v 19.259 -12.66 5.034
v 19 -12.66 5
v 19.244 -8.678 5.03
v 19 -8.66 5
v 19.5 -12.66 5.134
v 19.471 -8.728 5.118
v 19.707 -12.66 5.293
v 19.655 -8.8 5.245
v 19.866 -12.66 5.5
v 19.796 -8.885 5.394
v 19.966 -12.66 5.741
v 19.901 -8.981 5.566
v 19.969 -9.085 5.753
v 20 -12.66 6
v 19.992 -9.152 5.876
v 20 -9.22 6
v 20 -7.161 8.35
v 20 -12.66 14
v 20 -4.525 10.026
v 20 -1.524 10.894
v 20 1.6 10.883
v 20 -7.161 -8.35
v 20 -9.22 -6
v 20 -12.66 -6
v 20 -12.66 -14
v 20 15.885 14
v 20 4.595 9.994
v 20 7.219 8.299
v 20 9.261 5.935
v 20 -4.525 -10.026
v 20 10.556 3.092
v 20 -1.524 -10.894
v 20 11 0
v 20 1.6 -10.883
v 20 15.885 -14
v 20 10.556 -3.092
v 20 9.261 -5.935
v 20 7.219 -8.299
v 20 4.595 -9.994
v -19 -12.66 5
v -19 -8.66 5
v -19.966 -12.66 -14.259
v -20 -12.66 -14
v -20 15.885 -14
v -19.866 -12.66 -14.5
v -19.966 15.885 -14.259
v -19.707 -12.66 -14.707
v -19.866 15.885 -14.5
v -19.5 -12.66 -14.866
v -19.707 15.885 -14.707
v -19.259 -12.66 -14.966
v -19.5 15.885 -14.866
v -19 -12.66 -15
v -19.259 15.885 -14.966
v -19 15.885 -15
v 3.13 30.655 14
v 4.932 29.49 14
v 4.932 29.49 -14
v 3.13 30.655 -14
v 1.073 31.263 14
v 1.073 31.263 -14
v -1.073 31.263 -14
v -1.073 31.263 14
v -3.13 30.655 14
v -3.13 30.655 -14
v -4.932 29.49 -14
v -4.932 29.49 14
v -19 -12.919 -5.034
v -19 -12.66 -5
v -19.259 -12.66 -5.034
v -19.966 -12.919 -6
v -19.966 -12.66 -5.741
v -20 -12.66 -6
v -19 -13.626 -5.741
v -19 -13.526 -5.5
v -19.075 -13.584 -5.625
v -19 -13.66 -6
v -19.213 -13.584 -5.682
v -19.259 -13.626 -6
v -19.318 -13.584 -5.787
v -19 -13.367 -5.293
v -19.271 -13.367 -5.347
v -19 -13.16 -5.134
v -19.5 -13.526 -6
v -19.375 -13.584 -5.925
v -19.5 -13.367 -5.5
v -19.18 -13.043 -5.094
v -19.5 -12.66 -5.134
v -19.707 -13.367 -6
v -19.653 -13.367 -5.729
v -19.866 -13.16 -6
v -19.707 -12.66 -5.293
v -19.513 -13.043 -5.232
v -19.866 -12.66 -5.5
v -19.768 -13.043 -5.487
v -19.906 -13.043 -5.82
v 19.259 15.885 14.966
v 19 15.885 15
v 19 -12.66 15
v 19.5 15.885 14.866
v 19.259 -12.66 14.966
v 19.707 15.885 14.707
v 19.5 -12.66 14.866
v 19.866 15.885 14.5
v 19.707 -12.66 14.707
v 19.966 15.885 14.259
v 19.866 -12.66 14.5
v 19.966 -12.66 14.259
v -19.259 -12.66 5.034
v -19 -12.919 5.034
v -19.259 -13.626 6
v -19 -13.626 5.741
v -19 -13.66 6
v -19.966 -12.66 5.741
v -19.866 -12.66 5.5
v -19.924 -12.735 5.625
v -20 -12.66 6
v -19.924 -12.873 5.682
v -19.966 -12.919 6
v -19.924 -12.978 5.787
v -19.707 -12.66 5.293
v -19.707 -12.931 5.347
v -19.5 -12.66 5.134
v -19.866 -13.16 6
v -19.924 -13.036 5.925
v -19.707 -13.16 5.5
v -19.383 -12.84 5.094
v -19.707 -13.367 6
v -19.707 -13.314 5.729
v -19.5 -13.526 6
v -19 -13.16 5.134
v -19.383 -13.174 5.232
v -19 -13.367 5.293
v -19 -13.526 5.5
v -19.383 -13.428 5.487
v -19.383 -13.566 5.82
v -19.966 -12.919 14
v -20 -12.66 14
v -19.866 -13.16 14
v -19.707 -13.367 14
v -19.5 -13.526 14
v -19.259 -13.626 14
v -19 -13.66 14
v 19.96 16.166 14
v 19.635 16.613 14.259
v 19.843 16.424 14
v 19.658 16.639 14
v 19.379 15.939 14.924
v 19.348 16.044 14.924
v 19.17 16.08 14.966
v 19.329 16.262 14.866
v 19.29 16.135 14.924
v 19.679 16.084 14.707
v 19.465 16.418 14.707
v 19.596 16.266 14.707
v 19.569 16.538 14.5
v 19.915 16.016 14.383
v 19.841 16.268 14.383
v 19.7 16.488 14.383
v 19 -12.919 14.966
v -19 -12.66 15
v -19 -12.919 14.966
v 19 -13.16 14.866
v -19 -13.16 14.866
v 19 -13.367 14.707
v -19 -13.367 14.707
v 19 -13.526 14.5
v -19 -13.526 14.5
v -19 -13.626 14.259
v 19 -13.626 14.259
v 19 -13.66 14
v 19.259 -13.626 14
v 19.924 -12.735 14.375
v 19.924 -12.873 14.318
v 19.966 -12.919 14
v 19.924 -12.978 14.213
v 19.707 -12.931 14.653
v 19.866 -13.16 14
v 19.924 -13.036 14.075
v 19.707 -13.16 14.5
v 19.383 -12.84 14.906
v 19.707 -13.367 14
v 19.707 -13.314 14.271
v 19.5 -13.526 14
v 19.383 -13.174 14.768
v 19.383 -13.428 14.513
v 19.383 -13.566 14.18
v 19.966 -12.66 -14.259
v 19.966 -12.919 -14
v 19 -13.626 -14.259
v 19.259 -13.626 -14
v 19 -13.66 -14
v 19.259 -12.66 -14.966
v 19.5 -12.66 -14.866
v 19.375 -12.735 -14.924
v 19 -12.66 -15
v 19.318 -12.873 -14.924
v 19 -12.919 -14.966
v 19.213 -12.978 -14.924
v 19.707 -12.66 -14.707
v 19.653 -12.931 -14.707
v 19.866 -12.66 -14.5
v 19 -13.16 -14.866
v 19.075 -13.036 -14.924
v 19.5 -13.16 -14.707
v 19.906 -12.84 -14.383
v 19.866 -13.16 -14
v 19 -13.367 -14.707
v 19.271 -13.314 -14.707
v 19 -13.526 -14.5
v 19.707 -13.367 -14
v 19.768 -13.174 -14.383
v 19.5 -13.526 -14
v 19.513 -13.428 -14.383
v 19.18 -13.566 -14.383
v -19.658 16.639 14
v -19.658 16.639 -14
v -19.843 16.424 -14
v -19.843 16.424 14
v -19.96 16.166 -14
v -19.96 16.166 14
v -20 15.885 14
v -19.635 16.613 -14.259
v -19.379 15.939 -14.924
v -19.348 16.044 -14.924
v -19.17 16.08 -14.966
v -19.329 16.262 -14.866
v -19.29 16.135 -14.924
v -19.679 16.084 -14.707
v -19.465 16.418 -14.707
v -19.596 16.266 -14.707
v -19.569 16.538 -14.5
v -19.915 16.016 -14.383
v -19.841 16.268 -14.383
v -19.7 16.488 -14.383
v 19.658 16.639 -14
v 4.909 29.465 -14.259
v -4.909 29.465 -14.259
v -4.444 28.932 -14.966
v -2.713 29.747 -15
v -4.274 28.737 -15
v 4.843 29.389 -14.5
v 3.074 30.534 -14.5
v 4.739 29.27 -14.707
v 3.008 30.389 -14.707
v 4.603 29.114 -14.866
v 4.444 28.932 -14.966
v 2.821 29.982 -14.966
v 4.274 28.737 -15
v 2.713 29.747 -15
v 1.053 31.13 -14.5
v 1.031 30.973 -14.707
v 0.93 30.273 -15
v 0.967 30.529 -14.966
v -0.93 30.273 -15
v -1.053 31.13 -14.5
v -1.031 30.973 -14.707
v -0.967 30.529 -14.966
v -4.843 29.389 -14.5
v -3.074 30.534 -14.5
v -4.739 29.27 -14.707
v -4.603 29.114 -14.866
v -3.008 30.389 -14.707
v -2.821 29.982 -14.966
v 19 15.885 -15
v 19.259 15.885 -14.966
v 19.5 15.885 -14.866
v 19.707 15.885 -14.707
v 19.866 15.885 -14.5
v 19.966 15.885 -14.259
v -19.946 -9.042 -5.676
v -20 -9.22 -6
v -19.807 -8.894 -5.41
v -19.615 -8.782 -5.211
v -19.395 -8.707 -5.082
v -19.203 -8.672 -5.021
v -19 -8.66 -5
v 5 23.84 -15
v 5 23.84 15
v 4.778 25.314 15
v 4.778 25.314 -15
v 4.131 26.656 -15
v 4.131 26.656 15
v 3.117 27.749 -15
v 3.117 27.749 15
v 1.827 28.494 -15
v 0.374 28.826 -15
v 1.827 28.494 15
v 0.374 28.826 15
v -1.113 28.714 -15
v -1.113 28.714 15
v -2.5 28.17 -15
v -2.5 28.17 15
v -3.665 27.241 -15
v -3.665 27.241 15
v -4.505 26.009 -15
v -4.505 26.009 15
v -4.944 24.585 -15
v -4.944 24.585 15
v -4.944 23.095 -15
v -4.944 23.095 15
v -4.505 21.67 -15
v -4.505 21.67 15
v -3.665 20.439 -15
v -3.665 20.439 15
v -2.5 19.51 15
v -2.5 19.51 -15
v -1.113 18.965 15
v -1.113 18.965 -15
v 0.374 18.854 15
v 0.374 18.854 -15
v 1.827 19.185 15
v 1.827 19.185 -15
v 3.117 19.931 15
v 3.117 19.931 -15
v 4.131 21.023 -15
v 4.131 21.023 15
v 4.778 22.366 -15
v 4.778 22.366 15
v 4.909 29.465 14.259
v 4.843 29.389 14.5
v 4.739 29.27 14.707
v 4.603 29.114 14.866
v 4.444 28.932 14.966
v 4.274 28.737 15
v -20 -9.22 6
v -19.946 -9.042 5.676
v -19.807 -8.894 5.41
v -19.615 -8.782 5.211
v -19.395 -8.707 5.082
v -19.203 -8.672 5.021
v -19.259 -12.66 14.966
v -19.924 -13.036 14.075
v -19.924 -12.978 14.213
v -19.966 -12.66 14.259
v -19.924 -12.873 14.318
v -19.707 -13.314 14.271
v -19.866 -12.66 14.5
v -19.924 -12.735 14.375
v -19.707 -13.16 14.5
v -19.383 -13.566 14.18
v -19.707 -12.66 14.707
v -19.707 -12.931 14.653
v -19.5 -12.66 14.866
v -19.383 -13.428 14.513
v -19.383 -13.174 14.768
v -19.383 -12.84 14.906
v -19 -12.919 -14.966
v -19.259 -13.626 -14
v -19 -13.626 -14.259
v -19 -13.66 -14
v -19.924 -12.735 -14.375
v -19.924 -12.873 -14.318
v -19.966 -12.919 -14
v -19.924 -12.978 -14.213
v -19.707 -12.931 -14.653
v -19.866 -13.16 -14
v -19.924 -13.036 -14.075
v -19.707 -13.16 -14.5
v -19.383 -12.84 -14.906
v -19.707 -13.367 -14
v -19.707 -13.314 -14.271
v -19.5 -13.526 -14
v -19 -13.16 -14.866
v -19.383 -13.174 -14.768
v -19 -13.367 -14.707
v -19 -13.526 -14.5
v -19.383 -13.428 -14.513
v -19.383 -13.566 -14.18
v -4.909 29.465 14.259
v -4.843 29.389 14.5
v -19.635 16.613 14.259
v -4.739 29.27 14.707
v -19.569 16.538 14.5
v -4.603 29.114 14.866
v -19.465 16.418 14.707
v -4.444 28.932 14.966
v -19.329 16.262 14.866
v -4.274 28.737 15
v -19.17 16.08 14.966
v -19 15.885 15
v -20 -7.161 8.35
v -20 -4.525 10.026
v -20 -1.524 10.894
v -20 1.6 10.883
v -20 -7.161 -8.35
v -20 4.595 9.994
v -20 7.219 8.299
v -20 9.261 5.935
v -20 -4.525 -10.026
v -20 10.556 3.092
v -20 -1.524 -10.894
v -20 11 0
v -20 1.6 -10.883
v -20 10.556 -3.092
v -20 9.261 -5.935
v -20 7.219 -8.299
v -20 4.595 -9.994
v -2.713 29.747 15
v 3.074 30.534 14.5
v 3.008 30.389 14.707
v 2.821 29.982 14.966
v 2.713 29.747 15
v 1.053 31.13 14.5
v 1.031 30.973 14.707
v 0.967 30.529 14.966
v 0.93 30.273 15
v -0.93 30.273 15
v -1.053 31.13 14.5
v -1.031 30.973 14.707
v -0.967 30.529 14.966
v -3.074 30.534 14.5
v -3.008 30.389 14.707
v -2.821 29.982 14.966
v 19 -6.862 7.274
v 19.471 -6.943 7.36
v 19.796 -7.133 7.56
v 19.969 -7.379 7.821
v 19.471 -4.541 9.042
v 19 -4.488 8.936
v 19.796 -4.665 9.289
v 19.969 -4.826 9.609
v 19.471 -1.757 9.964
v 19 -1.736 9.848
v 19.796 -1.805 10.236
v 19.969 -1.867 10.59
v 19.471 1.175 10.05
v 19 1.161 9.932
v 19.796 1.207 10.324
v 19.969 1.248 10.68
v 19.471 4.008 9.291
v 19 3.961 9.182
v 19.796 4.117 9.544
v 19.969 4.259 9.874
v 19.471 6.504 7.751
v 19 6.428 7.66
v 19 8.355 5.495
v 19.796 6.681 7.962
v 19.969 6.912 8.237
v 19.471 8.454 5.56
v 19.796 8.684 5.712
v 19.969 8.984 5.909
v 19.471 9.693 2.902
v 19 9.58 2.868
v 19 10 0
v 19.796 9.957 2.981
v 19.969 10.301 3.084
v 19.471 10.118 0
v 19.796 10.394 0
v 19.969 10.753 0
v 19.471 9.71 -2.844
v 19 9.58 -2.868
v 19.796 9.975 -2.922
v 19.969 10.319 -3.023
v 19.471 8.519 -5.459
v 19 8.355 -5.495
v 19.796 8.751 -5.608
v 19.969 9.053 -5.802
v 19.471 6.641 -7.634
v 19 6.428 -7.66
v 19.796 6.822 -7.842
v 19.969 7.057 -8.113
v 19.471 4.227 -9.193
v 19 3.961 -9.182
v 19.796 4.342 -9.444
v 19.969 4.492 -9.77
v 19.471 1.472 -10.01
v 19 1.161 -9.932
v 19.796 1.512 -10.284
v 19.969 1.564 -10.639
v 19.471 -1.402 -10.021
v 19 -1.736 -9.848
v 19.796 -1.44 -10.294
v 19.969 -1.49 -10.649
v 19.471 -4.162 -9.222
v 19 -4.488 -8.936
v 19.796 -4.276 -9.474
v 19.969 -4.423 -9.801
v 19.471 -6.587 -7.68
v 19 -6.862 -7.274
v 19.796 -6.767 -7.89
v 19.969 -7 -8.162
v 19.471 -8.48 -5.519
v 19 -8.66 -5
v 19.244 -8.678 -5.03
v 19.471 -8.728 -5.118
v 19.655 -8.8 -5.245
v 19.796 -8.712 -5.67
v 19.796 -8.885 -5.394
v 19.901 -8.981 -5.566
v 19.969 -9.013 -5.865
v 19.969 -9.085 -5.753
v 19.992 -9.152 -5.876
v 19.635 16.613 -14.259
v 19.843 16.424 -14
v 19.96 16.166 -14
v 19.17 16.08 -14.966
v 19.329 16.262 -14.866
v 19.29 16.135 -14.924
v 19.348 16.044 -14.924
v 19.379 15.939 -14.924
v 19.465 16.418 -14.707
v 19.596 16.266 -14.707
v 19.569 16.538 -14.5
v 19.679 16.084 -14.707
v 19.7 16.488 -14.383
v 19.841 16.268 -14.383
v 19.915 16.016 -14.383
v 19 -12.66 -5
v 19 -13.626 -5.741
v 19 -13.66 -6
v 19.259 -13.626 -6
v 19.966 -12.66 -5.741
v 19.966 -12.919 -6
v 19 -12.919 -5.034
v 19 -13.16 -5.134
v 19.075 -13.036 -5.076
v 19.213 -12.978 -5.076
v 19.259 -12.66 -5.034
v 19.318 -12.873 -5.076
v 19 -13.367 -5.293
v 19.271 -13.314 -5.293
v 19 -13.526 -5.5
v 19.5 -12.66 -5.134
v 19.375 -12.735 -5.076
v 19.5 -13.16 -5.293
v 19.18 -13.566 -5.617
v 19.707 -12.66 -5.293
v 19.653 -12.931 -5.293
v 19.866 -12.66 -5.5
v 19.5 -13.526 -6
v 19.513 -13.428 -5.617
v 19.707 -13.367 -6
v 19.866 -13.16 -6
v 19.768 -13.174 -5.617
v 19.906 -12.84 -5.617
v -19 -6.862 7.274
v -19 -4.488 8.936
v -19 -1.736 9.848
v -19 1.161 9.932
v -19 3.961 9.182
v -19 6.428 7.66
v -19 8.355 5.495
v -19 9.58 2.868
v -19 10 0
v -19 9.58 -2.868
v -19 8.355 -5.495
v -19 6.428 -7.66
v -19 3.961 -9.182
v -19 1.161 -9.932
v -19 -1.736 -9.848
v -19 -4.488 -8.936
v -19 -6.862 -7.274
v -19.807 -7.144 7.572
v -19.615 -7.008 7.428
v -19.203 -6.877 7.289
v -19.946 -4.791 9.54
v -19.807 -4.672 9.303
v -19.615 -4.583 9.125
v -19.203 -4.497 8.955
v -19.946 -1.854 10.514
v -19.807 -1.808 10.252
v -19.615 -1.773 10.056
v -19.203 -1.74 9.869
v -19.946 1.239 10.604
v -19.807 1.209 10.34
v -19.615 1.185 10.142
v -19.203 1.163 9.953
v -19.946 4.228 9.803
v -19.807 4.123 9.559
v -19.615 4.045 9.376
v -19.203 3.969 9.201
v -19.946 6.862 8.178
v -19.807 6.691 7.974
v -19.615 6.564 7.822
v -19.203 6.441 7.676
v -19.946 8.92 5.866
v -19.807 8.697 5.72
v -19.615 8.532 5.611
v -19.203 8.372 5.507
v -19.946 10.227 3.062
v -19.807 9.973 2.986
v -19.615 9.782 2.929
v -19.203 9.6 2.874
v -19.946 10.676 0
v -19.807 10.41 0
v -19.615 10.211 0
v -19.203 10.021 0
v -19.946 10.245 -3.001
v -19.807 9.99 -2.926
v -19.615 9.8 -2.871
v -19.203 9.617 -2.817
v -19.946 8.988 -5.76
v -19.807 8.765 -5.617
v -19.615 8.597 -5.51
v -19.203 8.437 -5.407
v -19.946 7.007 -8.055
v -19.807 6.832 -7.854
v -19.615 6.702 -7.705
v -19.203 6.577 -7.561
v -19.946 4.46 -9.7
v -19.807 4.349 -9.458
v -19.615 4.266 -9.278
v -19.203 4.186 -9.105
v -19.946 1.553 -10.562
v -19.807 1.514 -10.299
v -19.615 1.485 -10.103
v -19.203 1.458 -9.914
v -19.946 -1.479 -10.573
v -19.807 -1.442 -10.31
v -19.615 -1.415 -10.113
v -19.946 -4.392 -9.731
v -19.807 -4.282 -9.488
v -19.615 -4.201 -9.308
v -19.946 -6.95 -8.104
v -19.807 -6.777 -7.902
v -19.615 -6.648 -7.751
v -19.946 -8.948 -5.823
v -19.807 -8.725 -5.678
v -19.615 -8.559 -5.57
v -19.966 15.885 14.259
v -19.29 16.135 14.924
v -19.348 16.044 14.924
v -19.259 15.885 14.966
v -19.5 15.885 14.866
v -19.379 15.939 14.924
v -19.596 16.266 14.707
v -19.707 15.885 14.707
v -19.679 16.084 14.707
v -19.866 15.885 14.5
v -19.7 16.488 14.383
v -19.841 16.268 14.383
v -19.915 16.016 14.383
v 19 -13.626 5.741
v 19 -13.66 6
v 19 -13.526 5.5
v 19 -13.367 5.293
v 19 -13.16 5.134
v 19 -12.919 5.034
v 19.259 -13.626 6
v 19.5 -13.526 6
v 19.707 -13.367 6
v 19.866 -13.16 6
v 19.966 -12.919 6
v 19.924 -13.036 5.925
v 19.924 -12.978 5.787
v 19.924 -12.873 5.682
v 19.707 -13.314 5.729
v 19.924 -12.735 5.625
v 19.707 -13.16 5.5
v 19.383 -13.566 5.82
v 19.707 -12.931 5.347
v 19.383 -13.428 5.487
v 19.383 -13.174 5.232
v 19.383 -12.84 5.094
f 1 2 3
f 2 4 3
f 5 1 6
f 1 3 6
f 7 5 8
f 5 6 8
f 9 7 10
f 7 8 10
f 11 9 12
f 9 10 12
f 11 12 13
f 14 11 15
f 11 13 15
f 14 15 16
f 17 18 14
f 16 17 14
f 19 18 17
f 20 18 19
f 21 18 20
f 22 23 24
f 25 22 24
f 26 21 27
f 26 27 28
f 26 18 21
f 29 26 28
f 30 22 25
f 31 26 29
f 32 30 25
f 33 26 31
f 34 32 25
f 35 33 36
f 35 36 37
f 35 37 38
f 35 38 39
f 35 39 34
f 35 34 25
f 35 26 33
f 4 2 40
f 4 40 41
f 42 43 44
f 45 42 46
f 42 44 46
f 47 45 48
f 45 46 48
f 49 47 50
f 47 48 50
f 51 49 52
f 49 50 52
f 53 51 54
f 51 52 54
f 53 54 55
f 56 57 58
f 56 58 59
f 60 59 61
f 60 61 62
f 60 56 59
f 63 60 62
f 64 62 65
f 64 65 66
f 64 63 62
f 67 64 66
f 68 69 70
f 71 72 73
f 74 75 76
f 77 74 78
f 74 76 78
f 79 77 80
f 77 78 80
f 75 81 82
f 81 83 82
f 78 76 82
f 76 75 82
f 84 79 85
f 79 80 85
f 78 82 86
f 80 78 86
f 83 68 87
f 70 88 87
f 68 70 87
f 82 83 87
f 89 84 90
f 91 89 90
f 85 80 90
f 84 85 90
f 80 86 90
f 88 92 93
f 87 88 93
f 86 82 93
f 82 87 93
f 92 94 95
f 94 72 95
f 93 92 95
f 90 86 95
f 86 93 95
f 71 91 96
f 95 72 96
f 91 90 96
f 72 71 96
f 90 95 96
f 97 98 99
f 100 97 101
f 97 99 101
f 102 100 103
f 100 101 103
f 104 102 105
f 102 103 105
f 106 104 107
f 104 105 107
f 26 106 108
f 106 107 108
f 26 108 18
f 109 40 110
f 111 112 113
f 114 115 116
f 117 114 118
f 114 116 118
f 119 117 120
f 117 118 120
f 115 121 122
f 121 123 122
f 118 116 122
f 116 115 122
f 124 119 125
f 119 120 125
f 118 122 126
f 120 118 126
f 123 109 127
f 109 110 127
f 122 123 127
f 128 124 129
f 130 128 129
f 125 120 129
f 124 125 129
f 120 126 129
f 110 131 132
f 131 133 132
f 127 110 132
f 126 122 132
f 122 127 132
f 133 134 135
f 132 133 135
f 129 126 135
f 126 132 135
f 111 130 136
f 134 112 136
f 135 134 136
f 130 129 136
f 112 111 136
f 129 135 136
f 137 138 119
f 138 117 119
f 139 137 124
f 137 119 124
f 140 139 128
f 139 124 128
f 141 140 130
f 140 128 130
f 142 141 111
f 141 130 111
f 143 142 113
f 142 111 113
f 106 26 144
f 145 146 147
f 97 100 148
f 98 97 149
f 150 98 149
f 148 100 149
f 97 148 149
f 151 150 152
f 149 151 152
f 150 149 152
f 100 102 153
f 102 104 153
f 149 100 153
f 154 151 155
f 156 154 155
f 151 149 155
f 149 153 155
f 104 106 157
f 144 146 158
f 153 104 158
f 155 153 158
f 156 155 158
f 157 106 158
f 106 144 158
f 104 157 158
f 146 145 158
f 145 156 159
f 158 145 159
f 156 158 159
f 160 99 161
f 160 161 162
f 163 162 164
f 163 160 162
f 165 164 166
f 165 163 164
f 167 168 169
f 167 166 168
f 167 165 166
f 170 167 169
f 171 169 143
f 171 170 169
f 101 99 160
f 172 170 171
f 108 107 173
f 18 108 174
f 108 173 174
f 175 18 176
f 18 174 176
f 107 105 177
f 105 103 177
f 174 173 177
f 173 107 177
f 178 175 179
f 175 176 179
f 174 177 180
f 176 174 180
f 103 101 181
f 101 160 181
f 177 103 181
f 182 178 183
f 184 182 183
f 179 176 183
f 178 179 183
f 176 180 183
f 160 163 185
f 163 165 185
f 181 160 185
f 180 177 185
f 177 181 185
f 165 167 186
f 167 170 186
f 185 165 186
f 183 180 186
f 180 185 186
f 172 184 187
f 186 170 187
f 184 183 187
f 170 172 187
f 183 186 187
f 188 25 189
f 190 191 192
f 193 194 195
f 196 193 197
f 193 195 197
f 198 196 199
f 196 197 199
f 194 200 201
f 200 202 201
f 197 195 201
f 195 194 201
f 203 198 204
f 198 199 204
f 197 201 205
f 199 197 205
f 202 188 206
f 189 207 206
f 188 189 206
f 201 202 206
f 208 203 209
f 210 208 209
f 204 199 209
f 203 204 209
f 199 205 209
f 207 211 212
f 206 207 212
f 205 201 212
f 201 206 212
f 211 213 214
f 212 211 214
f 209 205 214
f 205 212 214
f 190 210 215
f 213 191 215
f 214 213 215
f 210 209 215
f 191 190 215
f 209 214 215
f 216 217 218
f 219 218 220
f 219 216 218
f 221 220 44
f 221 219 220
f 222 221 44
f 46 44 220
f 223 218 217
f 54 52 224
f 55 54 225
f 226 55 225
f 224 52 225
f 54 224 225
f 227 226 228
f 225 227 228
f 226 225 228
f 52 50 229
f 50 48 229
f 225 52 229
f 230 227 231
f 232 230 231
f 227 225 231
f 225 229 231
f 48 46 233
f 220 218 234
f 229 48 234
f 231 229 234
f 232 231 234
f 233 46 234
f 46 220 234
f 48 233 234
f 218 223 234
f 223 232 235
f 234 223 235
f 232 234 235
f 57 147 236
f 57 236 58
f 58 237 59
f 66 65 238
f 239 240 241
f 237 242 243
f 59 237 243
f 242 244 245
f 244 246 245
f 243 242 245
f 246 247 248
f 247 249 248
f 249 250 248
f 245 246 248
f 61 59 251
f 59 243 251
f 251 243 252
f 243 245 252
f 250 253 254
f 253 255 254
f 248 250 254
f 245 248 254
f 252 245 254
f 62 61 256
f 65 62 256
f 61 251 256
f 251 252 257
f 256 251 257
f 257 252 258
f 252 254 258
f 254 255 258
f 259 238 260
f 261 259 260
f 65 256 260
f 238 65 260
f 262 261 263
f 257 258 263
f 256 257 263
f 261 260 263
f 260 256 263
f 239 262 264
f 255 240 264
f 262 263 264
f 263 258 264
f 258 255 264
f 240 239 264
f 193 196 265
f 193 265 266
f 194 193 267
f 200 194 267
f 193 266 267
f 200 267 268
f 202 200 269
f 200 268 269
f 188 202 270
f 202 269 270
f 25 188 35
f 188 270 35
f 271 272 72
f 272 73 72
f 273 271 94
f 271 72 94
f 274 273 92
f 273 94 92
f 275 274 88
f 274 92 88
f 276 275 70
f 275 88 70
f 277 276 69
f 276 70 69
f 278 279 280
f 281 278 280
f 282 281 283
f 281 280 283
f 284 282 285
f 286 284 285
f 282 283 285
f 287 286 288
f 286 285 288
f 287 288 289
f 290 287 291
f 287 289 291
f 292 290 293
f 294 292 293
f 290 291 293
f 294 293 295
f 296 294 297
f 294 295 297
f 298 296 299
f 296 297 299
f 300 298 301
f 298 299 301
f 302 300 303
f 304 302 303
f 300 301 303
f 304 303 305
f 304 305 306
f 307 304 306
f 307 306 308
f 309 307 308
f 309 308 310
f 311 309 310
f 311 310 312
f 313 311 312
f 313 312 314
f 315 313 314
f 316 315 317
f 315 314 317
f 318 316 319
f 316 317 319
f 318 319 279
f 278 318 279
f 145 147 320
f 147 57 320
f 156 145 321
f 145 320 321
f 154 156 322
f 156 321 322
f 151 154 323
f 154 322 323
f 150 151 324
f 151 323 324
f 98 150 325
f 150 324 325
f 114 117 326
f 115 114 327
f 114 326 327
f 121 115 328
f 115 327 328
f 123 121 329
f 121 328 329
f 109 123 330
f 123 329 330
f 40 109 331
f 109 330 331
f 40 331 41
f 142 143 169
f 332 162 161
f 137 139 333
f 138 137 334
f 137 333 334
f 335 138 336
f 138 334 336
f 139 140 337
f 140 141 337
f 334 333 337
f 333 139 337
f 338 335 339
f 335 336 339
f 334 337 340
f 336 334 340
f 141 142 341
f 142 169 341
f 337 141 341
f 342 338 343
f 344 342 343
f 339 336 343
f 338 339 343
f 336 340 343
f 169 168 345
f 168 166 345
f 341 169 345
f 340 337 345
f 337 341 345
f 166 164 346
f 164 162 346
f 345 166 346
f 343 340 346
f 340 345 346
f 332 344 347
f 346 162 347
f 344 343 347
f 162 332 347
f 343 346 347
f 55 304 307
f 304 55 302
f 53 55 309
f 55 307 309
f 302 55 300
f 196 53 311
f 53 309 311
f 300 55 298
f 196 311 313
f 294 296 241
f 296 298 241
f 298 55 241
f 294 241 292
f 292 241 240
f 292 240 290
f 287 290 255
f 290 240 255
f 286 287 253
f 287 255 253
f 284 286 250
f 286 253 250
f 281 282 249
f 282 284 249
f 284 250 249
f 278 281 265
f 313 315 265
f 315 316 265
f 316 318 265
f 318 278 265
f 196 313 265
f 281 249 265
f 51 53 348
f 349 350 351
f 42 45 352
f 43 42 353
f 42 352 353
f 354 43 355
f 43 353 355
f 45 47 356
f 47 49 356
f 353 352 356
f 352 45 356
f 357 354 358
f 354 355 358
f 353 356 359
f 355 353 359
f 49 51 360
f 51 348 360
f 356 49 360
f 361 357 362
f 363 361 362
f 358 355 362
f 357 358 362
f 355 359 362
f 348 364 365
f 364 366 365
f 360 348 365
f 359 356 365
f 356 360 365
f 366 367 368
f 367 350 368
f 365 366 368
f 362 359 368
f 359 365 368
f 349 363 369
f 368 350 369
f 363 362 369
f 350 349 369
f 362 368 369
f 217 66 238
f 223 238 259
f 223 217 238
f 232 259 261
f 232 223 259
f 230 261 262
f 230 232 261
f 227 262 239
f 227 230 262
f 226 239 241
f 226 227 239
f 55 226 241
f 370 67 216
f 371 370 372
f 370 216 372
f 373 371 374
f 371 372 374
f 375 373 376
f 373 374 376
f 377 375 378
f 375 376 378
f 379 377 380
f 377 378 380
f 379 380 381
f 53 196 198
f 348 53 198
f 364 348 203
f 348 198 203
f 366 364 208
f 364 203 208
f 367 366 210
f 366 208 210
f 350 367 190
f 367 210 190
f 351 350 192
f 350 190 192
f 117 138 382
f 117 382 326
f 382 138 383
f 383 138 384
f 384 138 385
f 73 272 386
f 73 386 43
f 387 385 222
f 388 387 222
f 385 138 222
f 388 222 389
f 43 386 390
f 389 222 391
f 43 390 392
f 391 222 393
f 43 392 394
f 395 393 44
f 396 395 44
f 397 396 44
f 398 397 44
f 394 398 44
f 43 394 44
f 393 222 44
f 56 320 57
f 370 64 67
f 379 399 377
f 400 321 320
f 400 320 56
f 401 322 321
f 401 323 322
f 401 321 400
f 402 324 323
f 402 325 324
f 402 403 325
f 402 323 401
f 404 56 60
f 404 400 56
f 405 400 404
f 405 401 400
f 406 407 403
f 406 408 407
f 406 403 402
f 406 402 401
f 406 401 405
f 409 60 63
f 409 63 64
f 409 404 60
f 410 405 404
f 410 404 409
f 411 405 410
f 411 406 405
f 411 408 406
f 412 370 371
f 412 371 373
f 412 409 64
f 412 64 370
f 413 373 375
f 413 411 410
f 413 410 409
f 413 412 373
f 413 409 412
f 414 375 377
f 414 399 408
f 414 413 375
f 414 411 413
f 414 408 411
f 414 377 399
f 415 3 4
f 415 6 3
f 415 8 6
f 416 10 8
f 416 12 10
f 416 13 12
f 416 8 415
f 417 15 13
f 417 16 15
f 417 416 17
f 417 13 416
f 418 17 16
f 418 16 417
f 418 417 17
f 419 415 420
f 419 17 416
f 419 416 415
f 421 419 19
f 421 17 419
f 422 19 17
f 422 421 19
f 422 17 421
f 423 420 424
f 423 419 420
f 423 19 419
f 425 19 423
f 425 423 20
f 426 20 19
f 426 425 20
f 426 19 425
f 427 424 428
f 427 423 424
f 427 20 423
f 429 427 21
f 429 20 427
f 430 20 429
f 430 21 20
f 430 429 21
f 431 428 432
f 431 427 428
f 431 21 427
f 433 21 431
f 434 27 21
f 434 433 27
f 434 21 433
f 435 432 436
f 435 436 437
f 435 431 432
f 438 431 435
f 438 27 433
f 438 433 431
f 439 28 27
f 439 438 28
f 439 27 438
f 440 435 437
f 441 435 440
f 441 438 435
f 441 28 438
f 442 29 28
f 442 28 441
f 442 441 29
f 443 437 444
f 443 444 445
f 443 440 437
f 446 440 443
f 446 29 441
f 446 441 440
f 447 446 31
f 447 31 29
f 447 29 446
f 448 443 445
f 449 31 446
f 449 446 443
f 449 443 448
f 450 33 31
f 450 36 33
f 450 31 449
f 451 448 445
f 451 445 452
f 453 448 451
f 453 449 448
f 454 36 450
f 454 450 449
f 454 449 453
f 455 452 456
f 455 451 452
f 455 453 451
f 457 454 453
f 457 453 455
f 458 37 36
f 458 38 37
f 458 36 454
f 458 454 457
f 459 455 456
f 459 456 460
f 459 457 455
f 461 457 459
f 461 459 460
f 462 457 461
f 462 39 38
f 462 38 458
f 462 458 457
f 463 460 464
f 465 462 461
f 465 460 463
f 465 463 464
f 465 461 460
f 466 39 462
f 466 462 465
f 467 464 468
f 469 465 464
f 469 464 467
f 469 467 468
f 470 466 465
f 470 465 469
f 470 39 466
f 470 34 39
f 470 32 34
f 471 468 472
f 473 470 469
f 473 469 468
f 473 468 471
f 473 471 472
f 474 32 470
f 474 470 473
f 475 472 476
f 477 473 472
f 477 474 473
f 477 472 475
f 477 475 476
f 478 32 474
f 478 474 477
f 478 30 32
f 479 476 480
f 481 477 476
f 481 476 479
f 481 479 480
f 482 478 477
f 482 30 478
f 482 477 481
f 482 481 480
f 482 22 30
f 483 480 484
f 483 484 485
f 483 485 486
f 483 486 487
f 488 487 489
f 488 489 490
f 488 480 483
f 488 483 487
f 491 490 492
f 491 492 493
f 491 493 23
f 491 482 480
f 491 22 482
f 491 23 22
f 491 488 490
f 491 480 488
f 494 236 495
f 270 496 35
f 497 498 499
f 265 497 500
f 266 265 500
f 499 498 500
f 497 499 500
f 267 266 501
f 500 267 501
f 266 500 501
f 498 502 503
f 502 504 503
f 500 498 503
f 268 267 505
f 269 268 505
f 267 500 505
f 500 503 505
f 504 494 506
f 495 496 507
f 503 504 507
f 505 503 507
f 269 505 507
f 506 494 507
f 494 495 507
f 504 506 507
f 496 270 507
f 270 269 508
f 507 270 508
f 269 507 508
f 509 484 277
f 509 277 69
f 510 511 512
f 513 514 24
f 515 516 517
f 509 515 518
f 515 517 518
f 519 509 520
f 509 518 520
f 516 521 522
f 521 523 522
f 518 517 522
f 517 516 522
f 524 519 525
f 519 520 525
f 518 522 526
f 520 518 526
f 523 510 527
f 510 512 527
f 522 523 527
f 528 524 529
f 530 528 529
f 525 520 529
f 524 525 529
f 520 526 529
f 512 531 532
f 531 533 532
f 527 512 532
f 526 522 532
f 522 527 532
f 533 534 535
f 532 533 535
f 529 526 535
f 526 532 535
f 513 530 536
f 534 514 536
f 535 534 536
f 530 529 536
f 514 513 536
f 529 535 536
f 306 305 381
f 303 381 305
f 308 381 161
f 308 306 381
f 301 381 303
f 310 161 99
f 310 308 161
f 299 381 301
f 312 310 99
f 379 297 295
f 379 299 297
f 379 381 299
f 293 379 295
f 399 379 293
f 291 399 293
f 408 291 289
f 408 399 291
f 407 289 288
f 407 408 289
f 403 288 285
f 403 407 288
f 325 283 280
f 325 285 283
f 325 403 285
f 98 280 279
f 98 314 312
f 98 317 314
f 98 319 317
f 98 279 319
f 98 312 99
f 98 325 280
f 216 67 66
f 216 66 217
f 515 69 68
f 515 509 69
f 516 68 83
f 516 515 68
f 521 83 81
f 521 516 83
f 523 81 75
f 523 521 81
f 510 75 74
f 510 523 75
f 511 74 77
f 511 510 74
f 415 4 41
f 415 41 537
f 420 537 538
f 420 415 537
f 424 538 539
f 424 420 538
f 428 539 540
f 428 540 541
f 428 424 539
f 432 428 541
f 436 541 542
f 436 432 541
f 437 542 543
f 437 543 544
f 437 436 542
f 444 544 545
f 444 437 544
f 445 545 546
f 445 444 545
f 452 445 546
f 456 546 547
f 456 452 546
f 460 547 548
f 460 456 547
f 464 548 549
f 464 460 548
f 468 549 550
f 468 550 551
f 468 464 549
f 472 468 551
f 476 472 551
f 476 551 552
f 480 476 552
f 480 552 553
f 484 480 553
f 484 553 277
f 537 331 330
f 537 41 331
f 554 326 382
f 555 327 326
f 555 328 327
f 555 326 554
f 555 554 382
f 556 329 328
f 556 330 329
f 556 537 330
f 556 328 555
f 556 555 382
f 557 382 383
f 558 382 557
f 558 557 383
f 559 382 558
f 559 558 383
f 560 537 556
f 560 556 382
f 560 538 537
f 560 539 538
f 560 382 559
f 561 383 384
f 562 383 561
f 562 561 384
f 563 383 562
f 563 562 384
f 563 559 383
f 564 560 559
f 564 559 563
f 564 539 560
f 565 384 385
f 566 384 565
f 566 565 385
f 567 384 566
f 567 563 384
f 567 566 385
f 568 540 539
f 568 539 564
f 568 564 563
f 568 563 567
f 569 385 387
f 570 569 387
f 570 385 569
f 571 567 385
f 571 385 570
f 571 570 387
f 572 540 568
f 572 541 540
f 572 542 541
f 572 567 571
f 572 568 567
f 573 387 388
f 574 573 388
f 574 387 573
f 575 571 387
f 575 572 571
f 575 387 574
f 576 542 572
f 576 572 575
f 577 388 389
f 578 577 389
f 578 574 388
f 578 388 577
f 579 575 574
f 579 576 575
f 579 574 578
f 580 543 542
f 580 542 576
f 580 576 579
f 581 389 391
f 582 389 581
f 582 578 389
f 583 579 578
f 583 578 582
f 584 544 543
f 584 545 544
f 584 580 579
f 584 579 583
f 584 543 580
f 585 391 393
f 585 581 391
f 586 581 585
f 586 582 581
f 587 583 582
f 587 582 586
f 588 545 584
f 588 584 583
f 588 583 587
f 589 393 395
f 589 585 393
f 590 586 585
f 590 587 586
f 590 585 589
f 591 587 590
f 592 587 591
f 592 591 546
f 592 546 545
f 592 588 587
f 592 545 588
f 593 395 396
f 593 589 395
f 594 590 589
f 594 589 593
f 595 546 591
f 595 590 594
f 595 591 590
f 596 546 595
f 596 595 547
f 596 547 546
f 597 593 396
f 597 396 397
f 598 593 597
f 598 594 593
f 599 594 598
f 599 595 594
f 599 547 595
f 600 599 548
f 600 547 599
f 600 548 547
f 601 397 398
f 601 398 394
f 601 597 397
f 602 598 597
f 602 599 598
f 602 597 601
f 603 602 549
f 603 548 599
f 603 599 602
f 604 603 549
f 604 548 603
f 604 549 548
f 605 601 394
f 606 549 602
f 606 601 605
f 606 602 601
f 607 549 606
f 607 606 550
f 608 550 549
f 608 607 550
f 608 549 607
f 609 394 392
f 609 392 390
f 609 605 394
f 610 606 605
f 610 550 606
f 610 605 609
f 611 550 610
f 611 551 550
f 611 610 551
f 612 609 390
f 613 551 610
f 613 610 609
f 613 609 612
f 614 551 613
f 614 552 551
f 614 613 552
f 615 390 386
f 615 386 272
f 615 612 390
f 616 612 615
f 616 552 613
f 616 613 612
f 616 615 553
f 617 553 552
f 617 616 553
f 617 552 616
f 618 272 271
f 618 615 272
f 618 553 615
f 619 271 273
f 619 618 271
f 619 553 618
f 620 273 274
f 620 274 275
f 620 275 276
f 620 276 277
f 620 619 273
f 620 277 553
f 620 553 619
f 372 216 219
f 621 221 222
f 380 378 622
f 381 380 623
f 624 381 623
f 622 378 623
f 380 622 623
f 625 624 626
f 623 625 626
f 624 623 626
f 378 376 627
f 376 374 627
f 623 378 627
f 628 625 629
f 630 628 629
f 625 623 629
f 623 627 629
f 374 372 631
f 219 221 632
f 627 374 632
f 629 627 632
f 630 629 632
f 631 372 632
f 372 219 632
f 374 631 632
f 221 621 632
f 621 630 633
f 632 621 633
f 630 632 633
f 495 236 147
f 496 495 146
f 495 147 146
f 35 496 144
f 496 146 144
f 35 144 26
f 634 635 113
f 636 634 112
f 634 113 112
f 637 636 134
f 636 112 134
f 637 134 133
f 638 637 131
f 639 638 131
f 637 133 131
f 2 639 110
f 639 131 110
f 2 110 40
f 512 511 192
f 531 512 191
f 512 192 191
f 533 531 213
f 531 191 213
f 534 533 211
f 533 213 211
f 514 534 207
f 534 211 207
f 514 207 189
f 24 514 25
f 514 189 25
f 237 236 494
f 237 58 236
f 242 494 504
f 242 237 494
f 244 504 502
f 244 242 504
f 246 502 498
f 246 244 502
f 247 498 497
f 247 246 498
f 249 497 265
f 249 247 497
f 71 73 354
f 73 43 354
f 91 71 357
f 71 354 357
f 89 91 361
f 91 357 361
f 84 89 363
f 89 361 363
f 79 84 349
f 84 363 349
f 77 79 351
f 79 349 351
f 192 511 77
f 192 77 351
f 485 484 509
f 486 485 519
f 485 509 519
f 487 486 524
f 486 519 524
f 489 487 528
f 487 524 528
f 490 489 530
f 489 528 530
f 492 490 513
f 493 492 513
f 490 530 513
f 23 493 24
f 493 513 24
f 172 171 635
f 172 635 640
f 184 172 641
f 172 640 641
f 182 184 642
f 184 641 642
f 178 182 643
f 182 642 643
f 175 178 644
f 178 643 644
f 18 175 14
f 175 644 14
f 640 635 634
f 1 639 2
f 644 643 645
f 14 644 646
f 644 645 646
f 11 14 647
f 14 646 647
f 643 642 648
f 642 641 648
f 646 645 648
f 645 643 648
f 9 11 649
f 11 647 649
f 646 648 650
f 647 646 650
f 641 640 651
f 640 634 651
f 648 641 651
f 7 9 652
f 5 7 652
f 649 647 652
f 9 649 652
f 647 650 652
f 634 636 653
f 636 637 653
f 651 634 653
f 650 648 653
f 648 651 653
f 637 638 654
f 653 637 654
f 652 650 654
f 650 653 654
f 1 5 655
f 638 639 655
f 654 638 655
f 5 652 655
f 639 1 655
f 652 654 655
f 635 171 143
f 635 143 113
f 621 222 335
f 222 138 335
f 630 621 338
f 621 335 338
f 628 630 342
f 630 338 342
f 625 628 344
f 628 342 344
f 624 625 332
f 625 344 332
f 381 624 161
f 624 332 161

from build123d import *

# Parameters (mm, degrees)
BOSS_EXTRUDE1_DEPTH = 20
SKETCH3_R           = 5
BOSS_EXTRUDE2_DEPTH = 30
FILLET1_R           = 1


with BuildPart() as part:
    # Sketch1 → Boss-Extrude1 (new body, symmetric)
    with BuildSketch(Plane(origin=(0, 0, 0), x_dir=(0, 0, -1), z_dir=(1, 0, 0))):
        with BuildLine():
            Line((5, -8.660254038), (5, -13.660254038))
            Line((5, -13.660254038), (15, -13.660254038))
            Line((15, -13.660254038), (15, 16.339745962))
            Line((15, 16.339745962), (-15, 16.339745962))
            Line((-15, 16.339745962), (-15, -13.660254038))
            Line((-15, -13.660254038), (-5, -13.660254038))
            Line((-5, -13.660254038), (-5, -8.660254038))
            ThreePointArc((-5, -8.660254038), (0, 10), (5, -8.660254038))
        make_face()
    extrude(amount=BOSS_EXTRUDE1_DEPTH, both=True)

    # Sketch3 → Boss-Extrude2 (add)
    with BuildSketch(Plane.XY.offset(15)):
        with BuildLine():
            Line((-20, 16.339745962), (20, 16.339745962))
            Line((20, 16.339745962), (4.931506849, 29.490430894))
            ThreePointArc((4.931506849, 29.490430894), (0, 31.339745962), (-4.931506849, 29.490430894))
            Line((-4.931506849, 29.490430894), (-20, 16.339745962))
        make_face()
        with Locations((0, 23.839745962)):
            Circle(SKETCH3_R, mode=Mode.SUBTRACT)
    extrude(amount=-BOSS_EXTRUDE2_DEPTH)

    # Fillet1
    fillet1_edges = [part.edges().sort_by_distance(p)[0] for p in [
        (20, -13.660254038, -10),
        (-20, -11.160254038, -5),
        (-20, 10, 0),
        (20, 1.339745962, -15),
        (0, -13.660254038, 5),
        (0, -13.660254038, 15),
        (0, -13.660254038, -15),
        (0, -13.660254038, -5),
        (20, 16.339745962, 0),
        (20, 1.339745962, 15),
        (20, -13.660254038, 10),
        (-12.465753425, 22.915088428, 15),
        (12.465753425, 22.915088428, 15),
        (0, 31.339745962, 15),
        (20, -11.160254038, 5),
        (-12.465753425, 22.915088428, -15),
        (0, 31.339745962, -15),
        (12.465753425, 22.915088428, -15),
        (20, 10, 0),
        (20, -11.160254038, -5),
        (-20, -11.160254038, 5),
        (-20, -13.660254038, 10),
        (-20, 1.339745962, 15),
        (-20, 16.339745962, 0),
        (-20, 1.339745962, -15),
        (-20, -13.660254038, -10),
    ]]
    fillet(fillet1_edges, radius=FILLET1_R)


solid = part.part
